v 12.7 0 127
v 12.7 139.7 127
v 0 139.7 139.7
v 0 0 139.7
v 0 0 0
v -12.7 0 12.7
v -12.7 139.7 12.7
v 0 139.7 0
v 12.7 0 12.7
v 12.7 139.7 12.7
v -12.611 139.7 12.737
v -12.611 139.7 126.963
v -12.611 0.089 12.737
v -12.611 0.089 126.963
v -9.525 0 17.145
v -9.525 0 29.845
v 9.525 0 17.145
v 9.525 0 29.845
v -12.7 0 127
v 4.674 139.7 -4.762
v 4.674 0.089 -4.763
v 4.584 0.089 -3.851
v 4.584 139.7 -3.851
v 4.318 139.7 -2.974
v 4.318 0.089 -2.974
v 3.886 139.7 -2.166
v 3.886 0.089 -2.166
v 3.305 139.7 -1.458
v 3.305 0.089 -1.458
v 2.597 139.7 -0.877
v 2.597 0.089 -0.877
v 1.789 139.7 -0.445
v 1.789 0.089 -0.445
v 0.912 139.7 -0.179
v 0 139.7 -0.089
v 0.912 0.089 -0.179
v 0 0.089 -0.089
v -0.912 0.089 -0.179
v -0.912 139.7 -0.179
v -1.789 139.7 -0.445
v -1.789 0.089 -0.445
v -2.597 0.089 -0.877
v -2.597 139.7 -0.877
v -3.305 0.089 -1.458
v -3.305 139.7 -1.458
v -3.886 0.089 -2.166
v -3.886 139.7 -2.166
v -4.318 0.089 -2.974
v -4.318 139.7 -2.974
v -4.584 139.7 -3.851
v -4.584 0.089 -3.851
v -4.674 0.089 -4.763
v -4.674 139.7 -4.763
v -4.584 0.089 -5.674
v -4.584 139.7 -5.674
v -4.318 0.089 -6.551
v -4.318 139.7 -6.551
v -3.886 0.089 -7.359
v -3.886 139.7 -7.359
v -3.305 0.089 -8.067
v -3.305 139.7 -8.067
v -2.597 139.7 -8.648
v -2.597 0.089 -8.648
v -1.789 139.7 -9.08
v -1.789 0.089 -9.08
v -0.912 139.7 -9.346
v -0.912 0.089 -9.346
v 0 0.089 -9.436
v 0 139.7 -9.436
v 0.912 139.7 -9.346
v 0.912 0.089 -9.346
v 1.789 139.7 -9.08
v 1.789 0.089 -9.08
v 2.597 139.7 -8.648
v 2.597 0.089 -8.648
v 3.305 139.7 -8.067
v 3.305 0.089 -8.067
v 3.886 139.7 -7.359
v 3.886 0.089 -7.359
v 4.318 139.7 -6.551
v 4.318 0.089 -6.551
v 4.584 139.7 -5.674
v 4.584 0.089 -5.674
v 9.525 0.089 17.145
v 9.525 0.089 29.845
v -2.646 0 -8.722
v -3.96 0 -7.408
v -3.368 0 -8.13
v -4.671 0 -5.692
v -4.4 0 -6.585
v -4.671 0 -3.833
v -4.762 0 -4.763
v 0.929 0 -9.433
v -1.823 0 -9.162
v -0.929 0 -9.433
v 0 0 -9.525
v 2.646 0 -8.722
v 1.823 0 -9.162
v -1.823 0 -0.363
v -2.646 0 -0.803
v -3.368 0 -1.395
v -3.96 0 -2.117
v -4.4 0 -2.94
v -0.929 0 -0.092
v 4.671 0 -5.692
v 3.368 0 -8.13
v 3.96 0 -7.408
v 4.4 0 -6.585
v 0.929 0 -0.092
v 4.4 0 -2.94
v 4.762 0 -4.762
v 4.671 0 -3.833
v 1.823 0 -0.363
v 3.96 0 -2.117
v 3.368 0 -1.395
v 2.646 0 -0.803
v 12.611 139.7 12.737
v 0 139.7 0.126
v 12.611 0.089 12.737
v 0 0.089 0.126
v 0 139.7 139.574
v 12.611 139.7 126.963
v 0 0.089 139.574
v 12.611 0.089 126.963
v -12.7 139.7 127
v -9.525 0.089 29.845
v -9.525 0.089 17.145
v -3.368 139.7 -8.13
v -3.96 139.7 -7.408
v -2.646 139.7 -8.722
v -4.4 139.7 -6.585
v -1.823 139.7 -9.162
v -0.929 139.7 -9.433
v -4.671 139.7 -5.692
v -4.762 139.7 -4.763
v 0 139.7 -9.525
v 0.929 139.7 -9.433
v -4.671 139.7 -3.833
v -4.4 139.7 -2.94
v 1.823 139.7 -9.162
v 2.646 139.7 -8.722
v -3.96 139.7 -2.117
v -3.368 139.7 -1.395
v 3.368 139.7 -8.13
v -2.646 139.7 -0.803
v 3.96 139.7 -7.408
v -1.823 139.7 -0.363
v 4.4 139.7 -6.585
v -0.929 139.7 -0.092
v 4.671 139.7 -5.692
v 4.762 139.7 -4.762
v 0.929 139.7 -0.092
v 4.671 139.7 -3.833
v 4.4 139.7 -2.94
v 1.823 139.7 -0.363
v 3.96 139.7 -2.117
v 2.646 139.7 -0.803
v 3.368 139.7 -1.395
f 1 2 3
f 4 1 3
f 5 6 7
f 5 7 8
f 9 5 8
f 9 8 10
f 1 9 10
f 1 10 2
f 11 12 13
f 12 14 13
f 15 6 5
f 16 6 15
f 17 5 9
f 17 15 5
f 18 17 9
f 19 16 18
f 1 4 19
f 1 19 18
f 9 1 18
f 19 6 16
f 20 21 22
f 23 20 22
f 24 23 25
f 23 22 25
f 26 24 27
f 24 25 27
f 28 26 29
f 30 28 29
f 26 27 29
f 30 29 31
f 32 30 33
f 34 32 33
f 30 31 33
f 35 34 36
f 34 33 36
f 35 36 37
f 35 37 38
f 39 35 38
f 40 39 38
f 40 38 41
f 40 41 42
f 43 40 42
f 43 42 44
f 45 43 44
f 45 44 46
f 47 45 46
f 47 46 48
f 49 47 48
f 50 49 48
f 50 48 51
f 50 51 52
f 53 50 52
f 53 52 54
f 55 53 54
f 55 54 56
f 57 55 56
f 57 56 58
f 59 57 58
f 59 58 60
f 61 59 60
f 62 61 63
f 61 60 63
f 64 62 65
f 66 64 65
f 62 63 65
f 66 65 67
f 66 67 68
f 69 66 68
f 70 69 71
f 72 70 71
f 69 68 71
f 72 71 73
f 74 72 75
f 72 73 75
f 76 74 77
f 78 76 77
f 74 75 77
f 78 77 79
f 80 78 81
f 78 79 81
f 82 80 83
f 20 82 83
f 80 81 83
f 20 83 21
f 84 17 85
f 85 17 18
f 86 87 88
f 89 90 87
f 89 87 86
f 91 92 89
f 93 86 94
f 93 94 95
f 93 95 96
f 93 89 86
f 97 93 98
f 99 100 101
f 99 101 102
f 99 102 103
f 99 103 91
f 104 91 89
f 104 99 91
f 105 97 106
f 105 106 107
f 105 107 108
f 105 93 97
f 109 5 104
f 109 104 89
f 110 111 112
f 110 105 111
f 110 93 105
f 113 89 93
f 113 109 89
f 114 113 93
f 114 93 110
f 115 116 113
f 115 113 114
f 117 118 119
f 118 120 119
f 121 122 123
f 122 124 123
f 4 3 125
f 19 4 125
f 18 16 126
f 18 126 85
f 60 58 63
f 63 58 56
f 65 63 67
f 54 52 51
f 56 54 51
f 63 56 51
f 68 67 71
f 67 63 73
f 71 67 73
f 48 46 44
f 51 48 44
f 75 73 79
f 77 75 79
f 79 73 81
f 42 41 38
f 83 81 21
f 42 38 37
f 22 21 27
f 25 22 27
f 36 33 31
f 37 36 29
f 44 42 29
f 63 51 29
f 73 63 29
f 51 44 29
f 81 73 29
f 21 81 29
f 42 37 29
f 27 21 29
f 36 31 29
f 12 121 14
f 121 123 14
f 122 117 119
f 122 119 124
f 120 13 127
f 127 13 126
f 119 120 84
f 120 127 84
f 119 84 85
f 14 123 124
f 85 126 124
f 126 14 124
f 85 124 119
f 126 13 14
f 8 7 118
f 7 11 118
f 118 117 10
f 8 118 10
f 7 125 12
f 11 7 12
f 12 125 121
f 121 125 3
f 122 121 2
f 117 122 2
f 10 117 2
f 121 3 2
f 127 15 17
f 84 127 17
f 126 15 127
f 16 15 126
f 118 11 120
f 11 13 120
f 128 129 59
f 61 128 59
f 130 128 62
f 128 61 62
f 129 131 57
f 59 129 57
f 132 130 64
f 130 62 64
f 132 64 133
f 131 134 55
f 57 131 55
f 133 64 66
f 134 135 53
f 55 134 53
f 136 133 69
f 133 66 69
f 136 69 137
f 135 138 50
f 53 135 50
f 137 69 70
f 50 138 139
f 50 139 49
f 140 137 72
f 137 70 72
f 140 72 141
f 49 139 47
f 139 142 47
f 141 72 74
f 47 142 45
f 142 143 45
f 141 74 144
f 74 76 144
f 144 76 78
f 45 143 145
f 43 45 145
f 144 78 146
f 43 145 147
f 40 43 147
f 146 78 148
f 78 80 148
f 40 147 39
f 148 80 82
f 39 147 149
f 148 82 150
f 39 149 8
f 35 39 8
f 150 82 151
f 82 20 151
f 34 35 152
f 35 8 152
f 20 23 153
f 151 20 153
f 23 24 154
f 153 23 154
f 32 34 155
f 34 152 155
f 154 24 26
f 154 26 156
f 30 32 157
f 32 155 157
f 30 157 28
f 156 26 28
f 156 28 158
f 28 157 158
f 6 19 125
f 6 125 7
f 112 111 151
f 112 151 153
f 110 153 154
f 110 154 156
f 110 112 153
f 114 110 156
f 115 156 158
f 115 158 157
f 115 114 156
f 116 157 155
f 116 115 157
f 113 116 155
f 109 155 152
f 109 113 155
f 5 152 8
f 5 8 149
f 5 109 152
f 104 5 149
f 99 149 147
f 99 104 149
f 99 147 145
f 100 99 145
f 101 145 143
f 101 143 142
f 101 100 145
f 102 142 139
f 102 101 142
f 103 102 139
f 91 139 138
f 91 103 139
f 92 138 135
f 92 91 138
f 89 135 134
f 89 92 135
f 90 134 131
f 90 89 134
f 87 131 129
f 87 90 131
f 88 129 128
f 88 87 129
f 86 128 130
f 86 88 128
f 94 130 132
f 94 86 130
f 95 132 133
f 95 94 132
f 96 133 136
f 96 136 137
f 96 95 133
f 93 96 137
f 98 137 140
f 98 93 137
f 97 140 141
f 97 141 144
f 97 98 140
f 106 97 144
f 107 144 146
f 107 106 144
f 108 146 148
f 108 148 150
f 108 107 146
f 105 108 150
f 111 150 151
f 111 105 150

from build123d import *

# Parameters (mm, degrees)
F0_W     = 19.05
F0_H     = 12.7
F1_DEPTH = 139.7
F2_R     = 4.7625
F3_DEPTH = 139.7
F4_T     = -0.0889
F4_2_T   = -0.0889
F5_DEPTH = 0.0889


with BuildPart() as f1:
    # F0 (on Front) → F1 (new body)
    with BuildSketch(Plane.XZ):
        Polygon((-12.7, 12.7), (0, 0), (12.7, 12.7), (12.7, 127), (0, 139.7), (-12.7, 127), align=None)
        with Locations((0, 23.495)):
            Rectangle(F0_W, F0_H, mode=Mode.SUBTRACT)
        with Locations((0, 23.495)):
            Rectangle(F0_W, F0_H)
    extrude(amount=-F1_DEPTH)

    # F4
    f4_openings = [f1.faces().sort_by_distance(p)[0] for p in [
        (0, 139.7, 69.85),
    ]]
    offset(amount=F4_T, openings=f4_openings)

    # F0 (on Front) → F5 (cut, through all)
    with BuildSketch(Plane.XZ):
        with Locations((0, 23.495)):
            Rectangle(F0_W, F0_H)
    extrude(amount=-F5_DEPTH, mode=Mode.SUBTRACT)


with BuildPart() as f3:
    # F2 (on Front) → F3 (new body, through all)
    with BuildSketch(Plane.XZ):
        with Locations((0, -4.7625)):
            Circle(F2_R)
    extrude(amount=-F3_DEPTH)

    # F4#2
    f4_2_openings = [f3.faces().sort_by_distance(p)[0] for p in [
        (0, 139.7, -4.7625),
    ]]
    offset(amount=F4_2_T, openings=f4_2_openings)


solid = Compound([f1.part, f3.part])
